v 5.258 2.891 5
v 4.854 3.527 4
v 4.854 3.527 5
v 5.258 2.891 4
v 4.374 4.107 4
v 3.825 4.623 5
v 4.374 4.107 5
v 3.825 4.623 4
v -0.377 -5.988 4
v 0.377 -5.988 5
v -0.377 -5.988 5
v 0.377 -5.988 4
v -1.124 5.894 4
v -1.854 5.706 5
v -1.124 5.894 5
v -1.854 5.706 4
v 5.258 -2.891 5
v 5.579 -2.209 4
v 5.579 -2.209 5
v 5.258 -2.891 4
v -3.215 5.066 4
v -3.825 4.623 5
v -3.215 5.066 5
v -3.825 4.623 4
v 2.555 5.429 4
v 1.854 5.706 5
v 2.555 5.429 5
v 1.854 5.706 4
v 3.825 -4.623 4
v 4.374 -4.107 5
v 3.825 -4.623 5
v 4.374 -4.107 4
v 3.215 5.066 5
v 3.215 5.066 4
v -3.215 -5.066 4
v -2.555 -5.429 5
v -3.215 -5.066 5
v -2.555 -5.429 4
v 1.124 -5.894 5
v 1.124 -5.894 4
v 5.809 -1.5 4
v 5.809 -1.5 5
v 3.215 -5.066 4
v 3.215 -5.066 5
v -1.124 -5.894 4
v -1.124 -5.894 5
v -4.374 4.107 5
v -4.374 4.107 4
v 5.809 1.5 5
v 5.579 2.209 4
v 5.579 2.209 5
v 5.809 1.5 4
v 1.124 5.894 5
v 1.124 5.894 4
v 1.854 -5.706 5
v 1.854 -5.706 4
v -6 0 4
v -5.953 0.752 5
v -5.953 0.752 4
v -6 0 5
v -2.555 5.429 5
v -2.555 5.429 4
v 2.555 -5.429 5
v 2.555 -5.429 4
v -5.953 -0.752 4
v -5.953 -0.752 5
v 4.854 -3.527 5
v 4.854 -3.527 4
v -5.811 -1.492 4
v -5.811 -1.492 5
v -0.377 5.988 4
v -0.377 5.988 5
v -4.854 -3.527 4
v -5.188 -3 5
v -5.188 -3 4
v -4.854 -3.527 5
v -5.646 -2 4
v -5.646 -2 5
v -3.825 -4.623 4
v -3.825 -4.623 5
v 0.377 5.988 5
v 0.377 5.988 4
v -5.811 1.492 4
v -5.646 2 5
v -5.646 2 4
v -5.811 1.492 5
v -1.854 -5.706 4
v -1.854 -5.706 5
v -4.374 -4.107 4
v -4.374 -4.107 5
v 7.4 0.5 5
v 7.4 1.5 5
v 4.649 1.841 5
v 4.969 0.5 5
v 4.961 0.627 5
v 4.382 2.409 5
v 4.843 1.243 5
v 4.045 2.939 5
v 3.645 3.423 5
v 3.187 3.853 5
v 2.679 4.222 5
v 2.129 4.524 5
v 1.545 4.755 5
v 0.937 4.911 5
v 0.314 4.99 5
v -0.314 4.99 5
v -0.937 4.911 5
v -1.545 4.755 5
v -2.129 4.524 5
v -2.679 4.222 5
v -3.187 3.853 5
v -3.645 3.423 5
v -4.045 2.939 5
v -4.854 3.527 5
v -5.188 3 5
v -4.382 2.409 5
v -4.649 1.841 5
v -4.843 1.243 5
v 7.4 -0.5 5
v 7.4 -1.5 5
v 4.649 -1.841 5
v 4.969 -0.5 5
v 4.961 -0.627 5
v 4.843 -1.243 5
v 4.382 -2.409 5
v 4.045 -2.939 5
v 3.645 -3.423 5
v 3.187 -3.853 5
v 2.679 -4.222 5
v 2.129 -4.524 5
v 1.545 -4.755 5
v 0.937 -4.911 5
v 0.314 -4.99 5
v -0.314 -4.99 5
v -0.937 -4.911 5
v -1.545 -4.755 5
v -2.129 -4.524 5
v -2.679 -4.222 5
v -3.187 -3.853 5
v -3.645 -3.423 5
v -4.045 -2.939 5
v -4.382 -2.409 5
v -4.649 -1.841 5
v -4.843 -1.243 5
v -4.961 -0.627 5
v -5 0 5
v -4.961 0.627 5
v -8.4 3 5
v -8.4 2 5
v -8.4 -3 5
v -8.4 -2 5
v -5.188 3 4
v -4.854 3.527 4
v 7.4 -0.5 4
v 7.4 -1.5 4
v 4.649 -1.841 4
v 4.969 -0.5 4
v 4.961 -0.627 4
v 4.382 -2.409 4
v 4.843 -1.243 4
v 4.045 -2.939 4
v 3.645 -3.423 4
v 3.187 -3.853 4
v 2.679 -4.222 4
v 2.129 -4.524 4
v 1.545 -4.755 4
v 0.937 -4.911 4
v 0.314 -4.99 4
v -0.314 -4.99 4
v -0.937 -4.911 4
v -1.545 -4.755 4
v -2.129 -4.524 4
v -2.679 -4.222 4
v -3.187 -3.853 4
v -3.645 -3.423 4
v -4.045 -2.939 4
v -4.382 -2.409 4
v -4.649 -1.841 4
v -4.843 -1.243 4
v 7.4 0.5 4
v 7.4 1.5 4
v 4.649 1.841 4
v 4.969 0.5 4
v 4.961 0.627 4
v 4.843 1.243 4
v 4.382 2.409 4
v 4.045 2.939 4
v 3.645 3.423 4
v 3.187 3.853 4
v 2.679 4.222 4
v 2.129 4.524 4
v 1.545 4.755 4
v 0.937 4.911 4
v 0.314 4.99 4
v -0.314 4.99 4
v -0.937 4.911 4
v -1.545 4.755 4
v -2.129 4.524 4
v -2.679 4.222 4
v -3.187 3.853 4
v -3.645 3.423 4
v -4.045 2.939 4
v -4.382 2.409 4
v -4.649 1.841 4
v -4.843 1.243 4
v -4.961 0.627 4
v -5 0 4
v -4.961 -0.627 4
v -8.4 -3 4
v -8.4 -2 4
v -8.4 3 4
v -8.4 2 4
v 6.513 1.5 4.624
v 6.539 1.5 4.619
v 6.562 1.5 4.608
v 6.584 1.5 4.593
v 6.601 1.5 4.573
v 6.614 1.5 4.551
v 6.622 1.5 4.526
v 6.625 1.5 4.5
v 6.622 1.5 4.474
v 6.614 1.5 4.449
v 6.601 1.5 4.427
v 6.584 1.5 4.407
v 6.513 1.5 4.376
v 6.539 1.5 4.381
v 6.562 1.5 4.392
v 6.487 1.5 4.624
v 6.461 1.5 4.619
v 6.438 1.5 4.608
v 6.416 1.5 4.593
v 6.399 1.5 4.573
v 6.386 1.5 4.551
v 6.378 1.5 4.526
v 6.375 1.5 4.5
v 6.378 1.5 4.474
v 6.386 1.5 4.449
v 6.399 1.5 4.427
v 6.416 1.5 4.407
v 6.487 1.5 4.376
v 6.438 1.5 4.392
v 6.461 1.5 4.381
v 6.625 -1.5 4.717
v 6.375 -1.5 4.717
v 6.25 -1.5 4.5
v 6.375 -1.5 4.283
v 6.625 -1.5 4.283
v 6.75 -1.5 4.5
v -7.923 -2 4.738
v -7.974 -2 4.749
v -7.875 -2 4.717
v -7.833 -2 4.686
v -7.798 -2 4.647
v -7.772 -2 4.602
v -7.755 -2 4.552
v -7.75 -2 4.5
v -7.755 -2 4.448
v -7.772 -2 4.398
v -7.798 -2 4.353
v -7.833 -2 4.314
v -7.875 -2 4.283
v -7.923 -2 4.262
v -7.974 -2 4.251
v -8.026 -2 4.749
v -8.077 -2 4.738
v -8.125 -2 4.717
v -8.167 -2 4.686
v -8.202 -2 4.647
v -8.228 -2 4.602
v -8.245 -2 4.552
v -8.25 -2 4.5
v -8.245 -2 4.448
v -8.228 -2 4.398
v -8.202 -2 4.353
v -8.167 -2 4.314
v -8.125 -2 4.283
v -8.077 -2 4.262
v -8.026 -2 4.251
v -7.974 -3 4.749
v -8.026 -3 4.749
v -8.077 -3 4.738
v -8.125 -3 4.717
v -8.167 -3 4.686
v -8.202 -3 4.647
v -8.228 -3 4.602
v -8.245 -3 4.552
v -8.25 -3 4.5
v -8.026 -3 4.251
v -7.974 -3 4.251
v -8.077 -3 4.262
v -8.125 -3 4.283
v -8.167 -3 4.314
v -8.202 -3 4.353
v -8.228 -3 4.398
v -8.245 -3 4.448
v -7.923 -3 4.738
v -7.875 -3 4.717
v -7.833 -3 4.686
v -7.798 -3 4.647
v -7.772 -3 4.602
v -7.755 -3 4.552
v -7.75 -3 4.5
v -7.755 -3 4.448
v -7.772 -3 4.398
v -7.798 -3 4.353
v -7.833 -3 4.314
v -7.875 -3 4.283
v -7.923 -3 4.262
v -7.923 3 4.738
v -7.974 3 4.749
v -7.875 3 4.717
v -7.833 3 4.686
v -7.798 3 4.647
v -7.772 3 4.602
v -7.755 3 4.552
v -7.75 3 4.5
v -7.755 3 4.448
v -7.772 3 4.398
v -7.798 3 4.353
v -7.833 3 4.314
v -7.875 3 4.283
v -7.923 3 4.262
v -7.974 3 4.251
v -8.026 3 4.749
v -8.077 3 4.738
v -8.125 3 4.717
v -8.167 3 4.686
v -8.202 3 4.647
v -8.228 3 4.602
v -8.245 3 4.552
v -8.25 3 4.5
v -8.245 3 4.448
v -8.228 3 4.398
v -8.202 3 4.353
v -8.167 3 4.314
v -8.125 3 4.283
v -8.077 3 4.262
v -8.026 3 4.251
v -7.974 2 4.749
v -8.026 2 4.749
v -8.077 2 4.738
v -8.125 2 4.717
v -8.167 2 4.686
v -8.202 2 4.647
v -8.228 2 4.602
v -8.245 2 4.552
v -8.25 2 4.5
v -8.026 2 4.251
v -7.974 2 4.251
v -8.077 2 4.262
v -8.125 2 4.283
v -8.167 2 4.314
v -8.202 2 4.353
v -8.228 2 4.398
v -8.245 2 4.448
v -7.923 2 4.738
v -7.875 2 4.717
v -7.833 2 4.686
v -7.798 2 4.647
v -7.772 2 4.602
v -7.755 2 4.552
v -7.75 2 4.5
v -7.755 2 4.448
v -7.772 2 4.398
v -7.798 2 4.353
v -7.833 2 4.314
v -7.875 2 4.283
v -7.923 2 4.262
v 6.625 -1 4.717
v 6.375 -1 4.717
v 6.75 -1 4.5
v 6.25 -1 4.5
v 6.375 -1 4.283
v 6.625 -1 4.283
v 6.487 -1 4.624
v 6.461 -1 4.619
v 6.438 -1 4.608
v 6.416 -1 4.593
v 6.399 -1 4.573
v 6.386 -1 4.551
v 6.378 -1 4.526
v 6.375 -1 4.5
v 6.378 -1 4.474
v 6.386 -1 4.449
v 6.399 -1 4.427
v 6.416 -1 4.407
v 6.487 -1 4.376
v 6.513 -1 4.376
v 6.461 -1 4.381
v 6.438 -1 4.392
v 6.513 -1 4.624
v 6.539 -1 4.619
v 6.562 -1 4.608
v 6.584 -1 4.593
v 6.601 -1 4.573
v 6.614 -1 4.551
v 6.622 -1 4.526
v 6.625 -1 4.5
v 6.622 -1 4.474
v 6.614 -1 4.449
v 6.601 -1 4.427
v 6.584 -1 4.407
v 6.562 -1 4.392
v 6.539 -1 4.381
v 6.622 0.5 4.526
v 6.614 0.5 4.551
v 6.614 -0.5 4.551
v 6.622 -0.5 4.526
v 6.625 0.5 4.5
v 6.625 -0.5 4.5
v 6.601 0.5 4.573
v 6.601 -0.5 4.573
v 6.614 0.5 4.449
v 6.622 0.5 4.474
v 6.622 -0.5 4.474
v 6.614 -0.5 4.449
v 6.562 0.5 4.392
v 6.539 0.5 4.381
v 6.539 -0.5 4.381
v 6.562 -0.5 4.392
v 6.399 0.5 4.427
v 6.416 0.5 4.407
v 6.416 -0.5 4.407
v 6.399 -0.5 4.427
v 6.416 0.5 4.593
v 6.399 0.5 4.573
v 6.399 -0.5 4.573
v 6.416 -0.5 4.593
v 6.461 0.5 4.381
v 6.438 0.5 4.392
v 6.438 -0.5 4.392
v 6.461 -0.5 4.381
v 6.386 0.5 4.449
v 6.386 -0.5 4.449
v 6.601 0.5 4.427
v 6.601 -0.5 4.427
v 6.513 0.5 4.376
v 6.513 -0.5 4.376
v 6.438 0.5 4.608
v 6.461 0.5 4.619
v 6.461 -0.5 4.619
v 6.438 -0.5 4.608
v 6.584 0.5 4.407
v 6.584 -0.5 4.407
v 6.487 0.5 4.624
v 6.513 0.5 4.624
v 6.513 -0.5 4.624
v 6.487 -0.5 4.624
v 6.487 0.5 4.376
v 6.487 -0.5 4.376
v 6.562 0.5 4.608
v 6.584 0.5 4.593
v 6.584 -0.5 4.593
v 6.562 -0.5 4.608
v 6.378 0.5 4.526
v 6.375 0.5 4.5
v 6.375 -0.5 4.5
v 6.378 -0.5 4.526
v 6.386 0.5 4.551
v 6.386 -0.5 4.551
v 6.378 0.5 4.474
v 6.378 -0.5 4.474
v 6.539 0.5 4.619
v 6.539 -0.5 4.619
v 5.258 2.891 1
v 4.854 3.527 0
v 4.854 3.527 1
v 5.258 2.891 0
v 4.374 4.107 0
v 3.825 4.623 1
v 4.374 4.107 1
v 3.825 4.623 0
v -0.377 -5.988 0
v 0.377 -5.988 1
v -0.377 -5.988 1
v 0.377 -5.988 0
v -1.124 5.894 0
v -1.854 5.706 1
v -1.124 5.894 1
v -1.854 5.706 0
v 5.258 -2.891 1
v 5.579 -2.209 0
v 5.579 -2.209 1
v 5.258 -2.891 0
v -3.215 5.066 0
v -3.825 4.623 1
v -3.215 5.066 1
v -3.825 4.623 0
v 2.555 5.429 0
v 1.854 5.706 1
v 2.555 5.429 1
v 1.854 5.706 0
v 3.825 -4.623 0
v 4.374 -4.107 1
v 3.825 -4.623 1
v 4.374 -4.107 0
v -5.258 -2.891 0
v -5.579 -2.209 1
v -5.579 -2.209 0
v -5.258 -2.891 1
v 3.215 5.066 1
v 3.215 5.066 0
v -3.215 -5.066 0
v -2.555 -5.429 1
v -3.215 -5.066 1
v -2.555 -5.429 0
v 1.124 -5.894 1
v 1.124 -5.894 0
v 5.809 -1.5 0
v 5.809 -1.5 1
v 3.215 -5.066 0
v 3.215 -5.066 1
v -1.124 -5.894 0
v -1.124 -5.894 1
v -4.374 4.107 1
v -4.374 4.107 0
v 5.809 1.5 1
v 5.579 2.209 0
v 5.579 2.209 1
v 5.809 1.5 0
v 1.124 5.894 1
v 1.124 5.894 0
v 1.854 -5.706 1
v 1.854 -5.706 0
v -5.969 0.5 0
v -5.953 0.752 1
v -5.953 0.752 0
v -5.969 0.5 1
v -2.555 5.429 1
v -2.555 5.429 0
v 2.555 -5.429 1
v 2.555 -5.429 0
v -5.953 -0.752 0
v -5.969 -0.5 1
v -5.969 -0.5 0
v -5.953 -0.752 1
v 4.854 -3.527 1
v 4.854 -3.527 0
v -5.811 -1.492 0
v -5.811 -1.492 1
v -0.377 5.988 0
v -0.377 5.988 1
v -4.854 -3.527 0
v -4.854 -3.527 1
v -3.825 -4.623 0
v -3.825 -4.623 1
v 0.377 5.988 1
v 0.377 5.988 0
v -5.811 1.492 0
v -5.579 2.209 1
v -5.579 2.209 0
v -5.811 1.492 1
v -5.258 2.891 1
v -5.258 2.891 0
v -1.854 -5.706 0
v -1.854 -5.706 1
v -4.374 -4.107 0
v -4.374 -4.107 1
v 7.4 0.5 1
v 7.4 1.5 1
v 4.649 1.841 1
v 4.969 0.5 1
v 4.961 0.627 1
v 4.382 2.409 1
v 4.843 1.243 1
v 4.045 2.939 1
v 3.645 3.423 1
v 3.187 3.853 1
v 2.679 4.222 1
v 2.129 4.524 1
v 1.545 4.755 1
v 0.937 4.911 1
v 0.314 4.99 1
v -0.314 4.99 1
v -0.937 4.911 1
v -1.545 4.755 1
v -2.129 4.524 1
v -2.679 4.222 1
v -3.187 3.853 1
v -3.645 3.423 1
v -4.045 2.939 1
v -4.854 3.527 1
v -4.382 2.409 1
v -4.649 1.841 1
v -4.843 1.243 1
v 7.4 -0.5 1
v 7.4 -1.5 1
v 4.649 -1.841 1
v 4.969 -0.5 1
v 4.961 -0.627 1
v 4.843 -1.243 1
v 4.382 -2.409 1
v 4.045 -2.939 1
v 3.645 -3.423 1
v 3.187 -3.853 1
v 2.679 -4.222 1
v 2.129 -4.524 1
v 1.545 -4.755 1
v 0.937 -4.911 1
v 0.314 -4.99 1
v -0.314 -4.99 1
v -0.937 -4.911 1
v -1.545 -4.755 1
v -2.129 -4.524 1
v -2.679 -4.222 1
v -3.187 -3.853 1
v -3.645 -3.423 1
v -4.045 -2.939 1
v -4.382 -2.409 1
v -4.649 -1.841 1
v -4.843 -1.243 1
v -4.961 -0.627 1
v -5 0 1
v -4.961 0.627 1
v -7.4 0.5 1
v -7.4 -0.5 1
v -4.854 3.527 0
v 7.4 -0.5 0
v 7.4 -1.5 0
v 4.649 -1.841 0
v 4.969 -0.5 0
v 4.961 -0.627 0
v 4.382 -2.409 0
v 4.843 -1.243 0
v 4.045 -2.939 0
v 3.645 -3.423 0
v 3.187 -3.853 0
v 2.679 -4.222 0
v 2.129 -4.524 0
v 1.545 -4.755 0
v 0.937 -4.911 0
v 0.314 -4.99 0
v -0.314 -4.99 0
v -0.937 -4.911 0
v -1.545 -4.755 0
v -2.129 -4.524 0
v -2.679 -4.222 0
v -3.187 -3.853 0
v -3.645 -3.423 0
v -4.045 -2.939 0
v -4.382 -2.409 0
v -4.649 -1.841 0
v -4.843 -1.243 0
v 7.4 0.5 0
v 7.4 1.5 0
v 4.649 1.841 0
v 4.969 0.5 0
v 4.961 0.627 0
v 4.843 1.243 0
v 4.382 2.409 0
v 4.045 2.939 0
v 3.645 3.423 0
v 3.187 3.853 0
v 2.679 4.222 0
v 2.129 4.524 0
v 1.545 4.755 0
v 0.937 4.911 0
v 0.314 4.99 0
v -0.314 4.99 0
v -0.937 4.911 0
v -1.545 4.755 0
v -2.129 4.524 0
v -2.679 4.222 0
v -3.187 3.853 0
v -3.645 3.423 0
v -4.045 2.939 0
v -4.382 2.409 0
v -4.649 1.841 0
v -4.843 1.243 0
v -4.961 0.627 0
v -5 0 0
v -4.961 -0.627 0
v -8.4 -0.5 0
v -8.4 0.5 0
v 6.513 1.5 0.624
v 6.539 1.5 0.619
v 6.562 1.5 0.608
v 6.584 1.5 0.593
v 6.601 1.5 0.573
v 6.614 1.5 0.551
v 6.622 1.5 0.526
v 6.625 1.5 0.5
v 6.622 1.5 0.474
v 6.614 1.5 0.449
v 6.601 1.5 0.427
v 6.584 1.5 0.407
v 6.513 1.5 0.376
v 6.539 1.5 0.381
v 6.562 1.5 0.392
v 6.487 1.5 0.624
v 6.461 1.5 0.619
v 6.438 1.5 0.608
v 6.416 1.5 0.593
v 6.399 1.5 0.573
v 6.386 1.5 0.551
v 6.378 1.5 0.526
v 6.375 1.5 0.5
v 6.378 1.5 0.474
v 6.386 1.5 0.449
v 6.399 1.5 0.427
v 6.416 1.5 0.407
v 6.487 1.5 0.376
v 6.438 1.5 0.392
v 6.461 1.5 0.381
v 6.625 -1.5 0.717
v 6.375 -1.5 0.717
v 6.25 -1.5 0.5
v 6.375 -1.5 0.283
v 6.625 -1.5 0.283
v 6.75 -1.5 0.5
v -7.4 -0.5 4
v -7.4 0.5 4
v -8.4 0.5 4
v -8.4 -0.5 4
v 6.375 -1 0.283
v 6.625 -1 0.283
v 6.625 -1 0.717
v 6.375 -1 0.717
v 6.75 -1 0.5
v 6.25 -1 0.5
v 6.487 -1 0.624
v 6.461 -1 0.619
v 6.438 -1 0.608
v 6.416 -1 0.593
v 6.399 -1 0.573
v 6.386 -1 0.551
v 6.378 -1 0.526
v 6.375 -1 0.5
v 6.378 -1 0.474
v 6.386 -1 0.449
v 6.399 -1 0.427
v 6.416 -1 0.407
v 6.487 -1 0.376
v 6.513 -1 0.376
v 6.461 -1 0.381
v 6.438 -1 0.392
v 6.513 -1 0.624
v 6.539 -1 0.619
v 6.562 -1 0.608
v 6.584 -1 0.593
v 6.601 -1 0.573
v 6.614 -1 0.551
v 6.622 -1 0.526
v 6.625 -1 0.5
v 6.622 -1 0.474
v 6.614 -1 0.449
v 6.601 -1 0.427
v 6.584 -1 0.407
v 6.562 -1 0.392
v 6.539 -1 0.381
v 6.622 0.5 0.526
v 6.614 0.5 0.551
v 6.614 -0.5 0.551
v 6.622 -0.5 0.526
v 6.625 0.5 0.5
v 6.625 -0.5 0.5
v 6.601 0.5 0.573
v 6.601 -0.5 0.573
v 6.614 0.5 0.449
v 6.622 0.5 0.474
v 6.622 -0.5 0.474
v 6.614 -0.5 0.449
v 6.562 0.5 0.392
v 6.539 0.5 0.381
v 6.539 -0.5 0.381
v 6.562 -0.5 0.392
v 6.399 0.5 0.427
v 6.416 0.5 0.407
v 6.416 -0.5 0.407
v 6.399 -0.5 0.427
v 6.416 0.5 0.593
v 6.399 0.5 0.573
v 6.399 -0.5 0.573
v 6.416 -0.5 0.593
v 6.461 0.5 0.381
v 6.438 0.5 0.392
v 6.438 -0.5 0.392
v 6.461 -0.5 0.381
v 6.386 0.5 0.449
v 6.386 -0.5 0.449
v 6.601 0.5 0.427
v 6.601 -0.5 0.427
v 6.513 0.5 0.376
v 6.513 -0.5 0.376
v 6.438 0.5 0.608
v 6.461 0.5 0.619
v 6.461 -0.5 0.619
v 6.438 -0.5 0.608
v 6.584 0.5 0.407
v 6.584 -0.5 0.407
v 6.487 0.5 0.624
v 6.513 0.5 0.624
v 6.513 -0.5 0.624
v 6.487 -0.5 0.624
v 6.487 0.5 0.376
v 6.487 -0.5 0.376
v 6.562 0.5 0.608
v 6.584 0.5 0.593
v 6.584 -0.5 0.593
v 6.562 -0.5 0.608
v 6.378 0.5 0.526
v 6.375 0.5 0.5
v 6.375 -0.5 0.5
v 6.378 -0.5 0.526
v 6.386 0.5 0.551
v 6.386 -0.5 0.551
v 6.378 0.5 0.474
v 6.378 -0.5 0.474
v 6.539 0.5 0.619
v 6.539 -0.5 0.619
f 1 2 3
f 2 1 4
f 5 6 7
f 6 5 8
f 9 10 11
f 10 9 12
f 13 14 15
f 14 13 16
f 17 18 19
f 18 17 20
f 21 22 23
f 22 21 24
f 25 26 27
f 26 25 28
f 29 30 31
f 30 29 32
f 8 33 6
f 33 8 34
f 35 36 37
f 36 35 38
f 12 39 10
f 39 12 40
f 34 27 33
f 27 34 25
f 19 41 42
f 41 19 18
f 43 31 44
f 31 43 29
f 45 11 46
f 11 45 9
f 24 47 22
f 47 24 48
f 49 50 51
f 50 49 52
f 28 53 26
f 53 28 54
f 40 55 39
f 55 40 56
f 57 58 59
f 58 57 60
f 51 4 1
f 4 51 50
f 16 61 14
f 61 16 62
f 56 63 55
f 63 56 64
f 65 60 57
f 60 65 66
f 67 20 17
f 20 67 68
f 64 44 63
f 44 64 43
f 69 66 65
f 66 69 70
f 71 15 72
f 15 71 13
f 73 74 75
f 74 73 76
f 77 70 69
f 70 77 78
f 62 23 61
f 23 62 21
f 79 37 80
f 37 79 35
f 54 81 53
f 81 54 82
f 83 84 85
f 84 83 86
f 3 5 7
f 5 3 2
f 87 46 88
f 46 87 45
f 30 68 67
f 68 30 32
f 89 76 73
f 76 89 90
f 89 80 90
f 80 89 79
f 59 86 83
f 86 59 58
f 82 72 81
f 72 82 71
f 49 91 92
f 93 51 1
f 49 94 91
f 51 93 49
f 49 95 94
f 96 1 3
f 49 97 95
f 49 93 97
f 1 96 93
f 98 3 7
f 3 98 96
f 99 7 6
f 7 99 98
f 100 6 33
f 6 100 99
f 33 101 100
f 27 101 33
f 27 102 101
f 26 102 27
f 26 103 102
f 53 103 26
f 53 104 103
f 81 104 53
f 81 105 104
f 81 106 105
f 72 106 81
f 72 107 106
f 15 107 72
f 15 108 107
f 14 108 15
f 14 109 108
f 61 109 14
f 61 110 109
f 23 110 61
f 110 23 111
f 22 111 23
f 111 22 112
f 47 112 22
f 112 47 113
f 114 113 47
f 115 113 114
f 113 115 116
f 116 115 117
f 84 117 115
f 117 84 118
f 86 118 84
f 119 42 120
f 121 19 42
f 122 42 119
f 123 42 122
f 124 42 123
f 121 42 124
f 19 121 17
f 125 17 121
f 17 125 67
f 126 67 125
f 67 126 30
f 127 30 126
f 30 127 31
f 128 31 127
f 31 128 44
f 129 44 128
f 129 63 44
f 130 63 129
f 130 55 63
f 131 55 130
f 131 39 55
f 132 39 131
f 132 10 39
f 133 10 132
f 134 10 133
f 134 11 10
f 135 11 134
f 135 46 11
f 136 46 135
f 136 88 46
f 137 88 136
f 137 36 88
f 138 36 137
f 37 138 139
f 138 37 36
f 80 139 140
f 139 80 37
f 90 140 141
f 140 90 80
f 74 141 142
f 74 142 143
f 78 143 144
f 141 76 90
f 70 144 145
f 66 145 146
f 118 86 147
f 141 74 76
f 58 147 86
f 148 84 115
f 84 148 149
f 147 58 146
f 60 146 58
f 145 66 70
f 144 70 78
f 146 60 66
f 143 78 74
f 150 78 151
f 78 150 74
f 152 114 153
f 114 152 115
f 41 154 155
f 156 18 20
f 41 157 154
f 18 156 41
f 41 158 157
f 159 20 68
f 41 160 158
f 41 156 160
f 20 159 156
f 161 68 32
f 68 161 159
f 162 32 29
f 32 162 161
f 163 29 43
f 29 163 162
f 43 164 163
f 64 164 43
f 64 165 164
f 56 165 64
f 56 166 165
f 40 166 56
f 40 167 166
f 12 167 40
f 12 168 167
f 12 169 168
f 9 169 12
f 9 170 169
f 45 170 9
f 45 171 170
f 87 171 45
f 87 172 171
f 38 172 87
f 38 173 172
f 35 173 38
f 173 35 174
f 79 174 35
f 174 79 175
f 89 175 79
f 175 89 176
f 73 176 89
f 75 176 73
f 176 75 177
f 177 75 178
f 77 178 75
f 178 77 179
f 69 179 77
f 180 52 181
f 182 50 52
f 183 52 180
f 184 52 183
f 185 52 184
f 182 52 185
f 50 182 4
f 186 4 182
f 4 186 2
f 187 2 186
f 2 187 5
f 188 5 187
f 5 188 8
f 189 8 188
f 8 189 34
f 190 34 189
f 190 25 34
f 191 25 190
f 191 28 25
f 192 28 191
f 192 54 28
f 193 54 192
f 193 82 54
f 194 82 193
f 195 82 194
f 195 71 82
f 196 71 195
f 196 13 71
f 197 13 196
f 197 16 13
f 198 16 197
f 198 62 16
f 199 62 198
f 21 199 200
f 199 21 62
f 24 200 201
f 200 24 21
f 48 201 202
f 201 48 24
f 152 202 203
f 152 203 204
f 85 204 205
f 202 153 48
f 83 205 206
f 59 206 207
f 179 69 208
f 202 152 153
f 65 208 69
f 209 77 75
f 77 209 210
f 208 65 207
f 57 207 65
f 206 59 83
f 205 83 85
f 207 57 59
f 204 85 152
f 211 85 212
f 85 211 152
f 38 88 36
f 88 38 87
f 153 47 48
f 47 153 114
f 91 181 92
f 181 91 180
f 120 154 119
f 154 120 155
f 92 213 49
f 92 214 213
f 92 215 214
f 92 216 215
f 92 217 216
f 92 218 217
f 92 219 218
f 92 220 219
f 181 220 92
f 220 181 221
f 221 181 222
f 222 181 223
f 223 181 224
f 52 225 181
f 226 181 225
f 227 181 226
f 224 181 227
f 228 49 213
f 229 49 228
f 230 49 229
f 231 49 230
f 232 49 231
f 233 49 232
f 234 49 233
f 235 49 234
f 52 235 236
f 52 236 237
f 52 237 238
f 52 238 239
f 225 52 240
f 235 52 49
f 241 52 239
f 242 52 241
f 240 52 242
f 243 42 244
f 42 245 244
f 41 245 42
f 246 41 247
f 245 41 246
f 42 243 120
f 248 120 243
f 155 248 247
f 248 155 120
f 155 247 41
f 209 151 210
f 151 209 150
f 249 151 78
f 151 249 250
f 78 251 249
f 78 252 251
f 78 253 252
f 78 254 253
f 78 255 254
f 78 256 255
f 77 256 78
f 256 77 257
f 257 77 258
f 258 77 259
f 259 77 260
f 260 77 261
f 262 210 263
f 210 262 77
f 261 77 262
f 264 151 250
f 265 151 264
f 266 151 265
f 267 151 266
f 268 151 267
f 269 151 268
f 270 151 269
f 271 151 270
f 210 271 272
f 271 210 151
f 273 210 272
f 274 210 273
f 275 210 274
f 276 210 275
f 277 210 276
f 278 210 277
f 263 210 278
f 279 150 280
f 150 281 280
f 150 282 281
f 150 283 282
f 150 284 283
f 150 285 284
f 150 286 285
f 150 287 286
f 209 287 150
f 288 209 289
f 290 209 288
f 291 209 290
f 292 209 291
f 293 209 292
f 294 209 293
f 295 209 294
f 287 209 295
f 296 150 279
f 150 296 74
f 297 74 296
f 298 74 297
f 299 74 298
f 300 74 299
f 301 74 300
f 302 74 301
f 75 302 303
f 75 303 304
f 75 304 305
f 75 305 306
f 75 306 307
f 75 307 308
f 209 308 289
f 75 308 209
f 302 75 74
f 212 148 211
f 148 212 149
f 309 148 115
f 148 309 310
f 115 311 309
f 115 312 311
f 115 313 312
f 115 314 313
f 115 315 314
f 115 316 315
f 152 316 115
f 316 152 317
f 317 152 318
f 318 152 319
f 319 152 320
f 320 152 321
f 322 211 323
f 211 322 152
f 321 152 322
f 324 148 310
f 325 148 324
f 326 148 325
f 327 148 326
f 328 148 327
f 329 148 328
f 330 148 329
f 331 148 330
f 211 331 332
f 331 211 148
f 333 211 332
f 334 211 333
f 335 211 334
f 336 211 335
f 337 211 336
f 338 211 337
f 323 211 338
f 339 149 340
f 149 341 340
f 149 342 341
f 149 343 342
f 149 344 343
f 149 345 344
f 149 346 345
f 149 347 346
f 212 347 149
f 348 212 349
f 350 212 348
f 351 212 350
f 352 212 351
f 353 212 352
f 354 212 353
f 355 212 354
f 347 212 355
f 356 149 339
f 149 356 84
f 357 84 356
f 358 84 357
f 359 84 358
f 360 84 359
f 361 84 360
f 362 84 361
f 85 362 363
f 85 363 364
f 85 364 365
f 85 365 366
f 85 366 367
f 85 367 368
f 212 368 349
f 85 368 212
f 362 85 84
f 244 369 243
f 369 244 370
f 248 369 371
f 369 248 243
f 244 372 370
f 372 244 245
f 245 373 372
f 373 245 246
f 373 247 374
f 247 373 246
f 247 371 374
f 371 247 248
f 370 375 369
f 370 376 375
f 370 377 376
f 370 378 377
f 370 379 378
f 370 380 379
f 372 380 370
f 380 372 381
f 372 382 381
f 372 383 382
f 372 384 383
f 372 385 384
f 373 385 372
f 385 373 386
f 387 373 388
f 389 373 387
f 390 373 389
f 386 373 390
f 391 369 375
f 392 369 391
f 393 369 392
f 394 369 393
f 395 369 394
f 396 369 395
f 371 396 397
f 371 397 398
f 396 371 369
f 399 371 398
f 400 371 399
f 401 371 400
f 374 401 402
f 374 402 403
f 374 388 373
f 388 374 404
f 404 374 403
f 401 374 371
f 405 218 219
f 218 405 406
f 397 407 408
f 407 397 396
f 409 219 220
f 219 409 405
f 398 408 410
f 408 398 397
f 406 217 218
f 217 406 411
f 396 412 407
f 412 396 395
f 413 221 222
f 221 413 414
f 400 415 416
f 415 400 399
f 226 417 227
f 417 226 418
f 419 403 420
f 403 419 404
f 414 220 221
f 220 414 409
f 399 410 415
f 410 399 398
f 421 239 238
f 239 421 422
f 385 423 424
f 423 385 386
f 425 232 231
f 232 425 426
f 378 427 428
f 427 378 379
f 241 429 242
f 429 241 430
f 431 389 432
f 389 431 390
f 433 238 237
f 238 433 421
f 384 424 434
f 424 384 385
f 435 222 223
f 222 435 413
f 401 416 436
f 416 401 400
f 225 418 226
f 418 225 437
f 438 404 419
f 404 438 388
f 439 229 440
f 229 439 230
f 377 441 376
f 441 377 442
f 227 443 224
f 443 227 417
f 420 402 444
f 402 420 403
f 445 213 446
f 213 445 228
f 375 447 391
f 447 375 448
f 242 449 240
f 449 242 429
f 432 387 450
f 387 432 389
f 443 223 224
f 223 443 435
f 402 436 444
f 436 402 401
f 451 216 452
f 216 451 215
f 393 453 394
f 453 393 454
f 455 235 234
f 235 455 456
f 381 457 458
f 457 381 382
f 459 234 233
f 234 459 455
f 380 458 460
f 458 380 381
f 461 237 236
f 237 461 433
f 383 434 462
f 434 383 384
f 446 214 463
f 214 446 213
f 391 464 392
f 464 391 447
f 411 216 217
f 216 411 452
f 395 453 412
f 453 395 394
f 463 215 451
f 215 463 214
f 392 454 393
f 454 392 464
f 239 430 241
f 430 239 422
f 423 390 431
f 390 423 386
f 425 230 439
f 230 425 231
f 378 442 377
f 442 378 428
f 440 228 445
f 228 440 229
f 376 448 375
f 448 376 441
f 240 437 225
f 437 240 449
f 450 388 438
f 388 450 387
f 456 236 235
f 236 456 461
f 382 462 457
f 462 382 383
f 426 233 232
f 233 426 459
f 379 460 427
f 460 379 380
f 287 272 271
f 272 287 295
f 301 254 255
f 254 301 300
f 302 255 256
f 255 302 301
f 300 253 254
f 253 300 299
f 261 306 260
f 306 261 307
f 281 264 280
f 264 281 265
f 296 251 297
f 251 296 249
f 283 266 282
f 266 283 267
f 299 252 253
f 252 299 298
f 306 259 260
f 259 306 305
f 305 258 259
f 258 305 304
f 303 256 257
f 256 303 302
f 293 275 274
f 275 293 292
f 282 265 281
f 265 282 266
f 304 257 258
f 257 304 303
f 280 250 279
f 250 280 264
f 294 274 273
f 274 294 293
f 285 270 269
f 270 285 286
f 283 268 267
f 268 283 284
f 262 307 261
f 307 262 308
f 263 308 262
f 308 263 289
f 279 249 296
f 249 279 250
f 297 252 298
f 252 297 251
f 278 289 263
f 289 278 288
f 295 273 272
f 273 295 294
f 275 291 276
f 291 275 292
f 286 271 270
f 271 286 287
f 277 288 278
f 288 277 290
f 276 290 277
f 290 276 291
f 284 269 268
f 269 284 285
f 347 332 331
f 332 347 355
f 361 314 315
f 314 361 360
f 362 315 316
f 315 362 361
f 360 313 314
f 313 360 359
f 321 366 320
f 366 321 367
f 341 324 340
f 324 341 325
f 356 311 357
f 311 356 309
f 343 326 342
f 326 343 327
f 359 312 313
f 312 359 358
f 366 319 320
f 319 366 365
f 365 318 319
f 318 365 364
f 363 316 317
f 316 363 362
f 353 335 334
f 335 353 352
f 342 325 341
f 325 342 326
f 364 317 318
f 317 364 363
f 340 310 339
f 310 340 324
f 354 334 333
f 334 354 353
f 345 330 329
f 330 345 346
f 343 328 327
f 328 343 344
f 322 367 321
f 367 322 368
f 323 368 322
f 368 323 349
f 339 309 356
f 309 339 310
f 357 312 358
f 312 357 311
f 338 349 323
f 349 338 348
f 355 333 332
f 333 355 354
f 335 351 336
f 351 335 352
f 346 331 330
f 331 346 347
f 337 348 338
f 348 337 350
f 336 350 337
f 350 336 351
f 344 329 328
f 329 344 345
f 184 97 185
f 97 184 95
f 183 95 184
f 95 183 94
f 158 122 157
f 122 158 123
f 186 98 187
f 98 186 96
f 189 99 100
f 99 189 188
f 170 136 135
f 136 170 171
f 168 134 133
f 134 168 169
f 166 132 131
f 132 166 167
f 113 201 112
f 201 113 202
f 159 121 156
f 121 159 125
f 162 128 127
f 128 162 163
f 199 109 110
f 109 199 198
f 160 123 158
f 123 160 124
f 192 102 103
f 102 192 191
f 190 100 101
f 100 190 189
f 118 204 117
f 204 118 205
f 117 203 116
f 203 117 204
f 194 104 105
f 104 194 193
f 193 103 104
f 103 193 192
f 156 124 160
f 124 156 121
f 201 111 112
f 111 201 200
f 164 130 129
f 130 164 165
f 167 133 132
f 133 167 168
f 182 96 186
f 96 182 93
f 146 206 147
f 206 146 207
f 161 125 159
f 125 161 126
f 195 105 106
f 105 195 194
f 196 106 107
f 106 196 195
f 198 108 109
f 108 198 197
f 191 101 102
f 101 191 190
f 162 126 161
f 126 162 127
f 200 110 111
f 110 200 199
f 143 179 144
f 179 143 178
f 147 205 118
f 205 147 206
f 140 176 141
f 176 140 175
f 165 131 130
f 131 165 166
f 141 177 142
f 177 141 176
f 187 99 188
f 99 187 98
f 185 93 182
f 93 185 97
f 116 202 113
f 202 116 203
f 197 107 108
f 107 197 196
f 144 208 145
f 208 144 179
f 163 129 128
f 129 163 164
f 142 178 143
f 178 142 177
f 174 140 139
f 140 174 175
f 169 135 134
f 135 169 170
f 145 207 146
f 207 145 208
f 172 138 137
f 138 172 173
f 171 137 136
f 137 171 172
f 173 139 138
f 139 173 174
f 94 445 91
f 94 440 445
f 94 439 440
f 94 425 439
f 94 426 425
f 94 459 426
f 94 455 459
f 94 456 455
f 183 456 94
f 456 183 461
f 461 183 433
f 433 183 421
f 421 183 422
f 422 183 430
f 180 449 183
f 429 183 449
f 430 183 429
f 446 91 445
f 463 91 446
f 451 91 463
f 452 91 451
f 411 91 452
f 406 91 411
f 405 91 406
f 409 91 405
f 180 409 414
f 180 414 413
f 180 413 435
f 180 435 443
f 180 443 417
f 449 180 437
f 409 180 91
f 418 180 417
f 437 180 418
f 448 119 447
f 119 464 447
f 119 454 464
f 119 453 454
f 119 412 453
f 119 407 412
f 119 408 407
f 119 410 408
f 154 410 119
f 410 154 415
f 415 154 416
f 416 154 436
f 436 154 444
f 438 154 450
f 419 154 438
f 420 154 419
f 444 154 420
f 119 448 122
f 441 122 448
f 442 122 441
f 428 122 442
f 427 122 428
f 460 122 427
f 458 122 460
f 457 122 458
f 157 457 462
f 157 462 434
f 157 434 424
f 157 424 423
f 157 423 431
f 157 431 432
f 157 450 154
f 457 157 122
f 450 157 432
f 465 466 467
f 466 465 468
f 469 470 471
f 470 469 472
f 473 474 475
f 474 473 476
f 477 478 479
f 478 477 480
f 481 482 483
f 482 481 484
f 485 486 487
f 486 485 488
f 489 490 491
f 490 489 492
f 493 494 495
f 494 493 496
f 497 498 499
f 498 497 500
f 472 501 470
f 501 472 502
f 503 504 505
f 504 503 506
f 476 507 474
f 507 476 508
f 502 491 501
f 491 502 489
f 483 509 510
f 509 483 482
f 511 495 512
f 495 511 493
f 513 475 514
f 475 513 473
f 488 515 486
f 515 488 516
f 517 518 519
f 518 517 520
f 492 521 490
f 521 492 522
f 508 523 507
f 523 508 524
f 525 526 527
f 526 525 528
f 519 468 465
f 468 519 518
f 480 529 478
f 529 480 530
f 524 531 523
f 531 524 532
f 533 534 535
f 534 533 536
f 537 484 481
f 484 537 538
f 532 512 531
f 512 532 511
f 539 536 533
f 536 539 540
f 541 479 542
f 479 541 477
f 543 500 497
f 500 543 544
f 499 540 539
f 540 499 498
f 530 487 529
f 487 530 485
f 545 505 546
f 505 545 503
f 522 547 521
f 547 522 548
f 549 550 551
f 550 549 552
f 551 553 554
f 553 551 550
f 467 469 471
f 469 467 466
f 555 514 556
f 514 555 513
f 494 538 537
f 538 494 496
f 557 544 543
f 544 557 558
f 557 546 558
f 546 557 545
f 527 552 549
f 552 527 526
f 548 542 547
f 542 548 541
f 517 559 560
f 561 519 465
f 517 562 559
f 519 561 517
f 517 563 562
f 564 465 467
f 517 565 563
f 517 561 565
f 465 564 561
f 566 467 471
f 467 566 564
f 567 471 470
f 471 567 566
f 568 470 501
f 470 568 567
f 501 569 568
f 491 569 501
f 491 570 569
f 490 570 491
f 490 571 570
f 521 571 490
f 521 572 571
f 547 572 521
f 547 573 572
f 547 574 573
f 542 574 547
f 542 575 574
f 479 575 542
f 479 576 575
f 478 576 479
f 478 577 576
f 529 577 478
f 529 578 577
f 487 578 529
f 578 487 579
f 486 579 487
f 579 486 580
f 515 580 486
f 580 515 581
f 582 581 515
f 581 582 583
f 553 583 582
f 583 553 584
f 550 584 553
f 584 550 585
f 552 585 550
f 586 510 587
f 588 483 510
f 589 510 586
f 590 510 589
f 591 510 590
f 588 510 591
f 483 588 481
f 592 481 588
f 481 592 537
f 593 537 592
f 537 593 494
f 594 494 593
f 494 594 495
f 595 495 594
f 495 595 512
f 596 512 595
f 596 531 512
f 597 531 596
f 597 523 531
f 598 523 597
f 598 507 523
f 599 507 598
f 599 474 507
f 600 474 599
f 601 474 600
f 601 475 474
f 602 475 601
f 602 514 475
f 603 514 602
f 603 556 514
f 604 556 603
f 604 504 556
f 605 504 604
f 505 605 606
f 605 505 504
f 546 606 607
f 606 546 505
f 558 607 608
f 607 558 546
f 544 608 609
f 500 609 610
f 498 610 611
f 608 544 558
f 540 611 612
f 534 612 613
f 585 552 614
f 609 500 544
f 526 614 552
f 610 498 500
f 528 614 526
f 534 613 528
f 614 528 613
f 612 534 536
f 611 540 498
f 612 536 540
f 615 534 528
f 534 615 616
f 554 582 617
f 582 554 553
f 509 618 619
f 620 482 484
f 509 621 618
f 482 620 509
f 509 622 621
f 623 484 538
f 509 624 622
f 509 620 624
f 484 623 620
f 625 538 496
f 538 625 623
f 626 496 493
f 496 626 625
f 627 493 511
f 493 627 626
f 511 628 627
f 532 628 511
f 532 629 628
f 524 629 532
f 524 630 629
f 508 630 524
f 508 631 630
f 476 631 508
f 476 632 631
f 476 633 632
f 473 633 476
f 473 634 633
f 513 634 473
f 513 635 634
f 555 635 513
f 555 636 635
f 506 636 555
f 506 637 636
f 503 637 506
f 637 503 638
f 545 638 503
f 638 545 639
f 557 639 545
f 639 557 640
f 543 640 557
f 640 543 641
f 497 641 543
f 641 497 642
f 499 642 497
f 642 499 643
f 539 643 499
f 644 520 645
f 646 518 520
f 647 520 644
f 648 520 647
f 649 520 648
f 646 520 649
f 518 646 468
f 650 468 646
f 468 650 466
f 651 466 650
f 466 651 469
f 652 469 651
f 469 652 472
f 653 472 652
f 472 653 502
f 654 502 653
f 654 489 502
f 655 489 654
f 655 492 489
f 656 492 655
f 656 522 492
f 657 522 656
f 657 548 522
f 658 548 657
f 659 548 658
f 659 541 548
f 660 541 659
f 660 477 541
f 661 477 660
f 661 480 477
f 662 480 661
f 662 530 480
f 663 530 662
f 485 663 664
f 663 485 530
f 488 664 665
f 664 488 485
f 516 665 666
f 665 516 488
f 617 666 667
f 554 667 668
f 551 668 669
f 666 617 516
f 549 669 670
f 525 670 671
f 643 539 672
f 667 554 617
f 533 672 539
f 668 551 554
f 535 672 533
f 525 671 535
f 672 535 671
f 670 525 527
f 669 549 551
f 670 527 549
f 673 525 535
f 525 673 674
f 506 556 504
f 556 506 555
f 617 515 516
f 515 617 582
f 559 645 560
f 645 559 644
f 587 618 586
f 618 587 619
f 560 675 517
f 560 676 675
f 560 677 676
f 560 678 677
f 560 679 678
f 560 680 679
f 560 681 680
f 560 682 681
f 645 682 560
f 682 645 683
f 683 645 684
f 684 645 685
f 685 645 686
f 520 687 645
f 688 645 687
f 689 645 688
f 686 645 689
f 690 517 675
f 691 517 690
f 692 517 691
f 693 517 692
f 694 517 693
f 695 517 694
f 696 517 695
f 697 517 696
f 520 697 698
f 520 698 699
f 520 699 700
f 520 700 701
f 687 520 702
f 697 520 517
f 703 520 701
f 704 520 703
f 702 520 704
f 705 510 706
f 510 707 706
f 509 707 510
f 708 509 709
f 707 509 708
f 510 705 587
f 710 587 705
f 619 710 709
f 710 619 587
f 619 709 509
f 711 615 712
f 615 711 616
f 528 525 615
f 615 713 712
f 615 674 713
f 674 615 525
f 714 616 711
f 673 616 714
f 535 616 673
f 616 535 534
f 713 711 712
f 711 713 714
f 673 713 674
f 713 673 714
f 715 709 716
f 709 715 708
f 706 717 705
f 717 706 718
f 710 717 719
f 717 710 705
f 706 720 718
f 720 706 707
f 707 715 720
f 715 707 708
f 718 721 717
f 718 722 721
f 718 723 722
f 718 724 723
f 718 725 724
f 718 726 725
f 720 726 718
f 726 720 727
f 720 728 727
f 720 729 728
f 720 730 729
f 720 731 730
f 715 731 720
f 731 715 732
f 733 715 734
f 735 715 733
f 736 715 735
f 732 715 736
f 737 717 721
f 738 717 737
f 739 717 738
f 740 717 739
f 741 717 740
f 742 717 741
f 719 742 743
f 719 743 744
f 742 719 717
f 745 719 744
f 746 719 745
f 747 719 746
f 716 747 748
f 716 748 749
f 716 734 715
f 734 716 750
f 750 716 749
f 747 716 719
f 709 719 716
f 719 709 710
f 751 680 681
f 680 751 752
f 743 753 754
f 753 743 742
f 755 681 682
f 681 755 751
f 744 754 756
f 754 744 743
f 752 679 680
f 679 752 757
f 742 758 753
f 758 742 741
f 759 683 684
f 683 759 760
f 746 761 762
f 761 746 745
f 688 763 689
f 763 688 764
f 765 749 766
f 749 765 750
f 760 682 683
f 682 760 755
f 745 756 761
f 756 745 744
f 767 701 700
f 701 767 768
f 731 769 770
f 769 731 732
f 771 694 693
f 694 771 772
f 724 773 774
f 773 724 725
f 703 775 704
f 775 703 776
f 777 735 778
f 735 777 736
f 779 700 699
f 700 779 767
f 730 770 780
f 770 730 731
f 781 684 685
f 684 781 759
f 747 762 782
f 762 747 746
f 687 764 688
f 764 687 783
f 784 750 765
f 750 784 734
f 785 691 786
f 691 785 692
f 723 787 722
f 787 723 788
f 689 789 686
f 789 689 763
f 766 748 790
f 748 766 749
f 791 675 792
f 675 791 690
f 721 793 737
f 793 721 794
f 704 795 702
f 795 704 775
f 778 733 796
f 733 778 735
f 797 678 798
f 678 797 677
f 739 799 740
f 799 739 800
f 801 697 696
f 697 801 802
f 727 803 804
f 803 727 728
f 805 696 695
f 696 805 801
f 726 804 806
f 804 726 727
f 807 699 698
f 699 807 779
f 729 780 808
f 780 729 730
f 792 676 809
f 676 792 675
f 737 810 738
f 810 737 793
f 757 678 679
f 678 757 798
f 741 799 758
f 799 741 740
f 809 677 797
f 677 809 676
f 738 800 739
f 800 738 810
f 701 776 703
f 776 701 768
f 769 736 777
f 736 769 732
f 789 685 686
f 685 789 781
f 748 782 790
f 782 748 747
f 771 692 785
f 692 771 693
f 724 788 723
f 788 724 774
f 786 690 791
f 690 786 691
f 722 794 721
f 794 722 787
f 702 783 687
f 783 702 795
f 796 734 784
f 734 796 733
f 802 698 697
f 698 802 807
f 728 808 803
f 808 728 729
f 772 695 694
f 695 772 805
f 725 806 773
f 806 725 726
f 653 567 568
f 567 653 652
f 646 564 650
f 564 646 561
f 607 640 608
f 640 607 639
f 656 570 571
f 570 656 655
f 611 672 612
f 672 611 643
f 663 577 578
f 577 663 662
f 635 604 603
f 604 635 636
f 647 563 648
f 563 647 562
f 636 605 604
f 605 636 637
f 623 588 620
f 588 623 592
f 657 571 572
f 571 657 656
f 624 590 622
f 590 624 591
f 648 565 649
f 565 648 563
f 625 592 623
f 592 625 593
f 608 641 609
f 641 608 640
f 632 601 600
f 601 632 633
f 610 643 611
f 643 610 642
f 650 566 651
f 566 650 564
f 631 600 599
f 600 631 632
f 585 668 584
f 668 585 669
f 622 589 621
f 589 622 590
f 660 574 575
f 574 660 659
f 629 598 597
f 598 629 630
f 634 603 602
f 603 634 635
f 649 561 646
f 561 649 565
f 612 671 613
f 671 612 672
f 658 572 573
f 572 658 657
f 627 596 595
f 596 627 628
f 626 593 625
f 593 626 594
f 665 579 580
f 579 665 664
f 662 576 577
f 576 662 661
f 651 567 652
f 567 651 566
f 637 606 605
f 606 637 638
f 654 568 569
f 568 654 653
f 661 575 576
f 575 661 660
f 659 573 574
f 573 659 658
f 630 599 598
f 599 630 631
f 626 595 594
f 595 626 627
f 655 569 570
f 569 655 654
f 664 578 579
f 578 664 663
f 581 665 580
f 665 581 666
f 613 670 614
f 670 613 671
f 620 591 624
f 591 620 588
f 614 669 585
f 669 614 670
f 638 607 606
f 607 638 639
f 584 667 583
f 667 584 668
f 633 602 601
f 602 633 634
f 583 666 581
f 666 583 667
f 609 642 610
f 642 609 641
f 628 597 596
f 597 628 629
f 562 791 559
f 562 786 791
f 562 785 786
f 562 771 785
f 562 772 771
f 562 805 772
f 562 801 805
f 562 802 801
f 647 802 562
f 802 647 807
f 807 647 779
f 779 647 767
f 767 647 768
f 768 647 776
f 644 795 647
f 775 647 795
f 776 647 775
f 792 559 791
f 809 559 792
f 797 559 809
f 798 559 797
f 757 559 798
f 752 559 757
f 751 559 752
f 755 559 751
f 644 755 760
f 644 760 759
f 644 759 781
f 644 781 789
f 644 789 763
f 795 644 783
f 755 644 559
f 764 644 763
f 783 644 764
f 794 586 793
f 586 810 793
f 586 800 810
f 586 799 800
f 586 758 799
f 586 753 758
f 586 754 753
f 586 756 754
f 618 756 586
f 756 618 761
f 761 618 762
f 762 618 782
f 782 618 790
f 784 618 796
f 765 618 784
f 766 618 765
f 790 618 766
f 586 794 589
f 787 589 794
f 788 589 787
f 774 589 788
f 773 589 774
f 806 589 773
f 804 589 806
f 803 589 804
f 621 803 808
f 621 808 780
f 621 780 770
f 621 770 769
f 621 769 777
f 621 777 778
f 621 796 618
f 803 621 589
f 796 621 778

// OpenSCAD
diameter=10;
thikness=2;
nb_face=50;
union() {
  translate([0, 0, 4]) 
    difference() {
      union() {
        cylinder(d=diameter+thikness, h=1, $fn=nb_face);
        translate([(diameter)/2 + (thikness-thikness*0.3), 0, 1/2]) 
          cube([thikness, thikness*1.5, 1], center=true);
        translate([-((diameter)/2 + (thikness-thikness*0.3)), -2.5, 1/2])
          #cube([4, thikness/2, 1], center=true);
        translate([-((diameter)/2 + (thikness-thikness*0.3)), 2.5, 1/2])
          #cube([4, thikness/2, 1], center=true);
      }
      union() {
        cylinder(d=diameter, h=1, $fn=nb_face);
        translate([(diameter/2), 0, 1/2]) 
          cube([diameter, thikness/2, 1], center=true);
        rotate(90, [1, 0 , 0]) {
          translate([6.5, 1/2, 1]) 
            cylinder(d=1/2, h=3, $fn=6);
          translate([6.5, 1/2, -1.5]) 
            cylinder(d=1/4, h=3, $fn=30);
          translate([-(diameter/2 + 3), 0.5, 1/2])
            cylinder(d=1/2, h=thikness*2, $fn=30);
          translate([-(diameter/2 + 3), 0.5, -5])
            #cylinder(d=1/2, h=thikness*2, $fn=30);
        }
      }
    }
  // premiere bague
  difference() {
    union() {
      cylinder(d=diameter+thikness, h=1, $fn=nb_face);
      translate([(diameter)/2 + (thikness-thikness*0.3), 0, 1/2]) 
        cube([thikness, thikness*1.5, 1], center=true);
      
      translate([-((diameter)/2 + (thikness-thikness*0.3)), 0, 1/2])
        cube([thikness, 1, 1], center=true); 
      
      translate([-((diameter)/2 + (thikness*2-thikness*0.3)), -1/2, 0])
        cube([1, 1, 4], center=false); 
    }
    union() {
      cylinder(d=diameter, h=1, $fn=nb_face);
      translate([(diameter)/2, 0, 1/2]) 
        cube([thikness*6, thikness/2, 1], center=true);
      rotate(90, [1, 0 , 0]) {
        translate([6.5, 1/2, 1]) 
          cylinder(d=1/2, h=3, $fn=6);
        translate([6.5, 1/2, -1.5]) 
          cylinder(d=1/4, h=3, $fn=30);
      }
    }
  }
}
